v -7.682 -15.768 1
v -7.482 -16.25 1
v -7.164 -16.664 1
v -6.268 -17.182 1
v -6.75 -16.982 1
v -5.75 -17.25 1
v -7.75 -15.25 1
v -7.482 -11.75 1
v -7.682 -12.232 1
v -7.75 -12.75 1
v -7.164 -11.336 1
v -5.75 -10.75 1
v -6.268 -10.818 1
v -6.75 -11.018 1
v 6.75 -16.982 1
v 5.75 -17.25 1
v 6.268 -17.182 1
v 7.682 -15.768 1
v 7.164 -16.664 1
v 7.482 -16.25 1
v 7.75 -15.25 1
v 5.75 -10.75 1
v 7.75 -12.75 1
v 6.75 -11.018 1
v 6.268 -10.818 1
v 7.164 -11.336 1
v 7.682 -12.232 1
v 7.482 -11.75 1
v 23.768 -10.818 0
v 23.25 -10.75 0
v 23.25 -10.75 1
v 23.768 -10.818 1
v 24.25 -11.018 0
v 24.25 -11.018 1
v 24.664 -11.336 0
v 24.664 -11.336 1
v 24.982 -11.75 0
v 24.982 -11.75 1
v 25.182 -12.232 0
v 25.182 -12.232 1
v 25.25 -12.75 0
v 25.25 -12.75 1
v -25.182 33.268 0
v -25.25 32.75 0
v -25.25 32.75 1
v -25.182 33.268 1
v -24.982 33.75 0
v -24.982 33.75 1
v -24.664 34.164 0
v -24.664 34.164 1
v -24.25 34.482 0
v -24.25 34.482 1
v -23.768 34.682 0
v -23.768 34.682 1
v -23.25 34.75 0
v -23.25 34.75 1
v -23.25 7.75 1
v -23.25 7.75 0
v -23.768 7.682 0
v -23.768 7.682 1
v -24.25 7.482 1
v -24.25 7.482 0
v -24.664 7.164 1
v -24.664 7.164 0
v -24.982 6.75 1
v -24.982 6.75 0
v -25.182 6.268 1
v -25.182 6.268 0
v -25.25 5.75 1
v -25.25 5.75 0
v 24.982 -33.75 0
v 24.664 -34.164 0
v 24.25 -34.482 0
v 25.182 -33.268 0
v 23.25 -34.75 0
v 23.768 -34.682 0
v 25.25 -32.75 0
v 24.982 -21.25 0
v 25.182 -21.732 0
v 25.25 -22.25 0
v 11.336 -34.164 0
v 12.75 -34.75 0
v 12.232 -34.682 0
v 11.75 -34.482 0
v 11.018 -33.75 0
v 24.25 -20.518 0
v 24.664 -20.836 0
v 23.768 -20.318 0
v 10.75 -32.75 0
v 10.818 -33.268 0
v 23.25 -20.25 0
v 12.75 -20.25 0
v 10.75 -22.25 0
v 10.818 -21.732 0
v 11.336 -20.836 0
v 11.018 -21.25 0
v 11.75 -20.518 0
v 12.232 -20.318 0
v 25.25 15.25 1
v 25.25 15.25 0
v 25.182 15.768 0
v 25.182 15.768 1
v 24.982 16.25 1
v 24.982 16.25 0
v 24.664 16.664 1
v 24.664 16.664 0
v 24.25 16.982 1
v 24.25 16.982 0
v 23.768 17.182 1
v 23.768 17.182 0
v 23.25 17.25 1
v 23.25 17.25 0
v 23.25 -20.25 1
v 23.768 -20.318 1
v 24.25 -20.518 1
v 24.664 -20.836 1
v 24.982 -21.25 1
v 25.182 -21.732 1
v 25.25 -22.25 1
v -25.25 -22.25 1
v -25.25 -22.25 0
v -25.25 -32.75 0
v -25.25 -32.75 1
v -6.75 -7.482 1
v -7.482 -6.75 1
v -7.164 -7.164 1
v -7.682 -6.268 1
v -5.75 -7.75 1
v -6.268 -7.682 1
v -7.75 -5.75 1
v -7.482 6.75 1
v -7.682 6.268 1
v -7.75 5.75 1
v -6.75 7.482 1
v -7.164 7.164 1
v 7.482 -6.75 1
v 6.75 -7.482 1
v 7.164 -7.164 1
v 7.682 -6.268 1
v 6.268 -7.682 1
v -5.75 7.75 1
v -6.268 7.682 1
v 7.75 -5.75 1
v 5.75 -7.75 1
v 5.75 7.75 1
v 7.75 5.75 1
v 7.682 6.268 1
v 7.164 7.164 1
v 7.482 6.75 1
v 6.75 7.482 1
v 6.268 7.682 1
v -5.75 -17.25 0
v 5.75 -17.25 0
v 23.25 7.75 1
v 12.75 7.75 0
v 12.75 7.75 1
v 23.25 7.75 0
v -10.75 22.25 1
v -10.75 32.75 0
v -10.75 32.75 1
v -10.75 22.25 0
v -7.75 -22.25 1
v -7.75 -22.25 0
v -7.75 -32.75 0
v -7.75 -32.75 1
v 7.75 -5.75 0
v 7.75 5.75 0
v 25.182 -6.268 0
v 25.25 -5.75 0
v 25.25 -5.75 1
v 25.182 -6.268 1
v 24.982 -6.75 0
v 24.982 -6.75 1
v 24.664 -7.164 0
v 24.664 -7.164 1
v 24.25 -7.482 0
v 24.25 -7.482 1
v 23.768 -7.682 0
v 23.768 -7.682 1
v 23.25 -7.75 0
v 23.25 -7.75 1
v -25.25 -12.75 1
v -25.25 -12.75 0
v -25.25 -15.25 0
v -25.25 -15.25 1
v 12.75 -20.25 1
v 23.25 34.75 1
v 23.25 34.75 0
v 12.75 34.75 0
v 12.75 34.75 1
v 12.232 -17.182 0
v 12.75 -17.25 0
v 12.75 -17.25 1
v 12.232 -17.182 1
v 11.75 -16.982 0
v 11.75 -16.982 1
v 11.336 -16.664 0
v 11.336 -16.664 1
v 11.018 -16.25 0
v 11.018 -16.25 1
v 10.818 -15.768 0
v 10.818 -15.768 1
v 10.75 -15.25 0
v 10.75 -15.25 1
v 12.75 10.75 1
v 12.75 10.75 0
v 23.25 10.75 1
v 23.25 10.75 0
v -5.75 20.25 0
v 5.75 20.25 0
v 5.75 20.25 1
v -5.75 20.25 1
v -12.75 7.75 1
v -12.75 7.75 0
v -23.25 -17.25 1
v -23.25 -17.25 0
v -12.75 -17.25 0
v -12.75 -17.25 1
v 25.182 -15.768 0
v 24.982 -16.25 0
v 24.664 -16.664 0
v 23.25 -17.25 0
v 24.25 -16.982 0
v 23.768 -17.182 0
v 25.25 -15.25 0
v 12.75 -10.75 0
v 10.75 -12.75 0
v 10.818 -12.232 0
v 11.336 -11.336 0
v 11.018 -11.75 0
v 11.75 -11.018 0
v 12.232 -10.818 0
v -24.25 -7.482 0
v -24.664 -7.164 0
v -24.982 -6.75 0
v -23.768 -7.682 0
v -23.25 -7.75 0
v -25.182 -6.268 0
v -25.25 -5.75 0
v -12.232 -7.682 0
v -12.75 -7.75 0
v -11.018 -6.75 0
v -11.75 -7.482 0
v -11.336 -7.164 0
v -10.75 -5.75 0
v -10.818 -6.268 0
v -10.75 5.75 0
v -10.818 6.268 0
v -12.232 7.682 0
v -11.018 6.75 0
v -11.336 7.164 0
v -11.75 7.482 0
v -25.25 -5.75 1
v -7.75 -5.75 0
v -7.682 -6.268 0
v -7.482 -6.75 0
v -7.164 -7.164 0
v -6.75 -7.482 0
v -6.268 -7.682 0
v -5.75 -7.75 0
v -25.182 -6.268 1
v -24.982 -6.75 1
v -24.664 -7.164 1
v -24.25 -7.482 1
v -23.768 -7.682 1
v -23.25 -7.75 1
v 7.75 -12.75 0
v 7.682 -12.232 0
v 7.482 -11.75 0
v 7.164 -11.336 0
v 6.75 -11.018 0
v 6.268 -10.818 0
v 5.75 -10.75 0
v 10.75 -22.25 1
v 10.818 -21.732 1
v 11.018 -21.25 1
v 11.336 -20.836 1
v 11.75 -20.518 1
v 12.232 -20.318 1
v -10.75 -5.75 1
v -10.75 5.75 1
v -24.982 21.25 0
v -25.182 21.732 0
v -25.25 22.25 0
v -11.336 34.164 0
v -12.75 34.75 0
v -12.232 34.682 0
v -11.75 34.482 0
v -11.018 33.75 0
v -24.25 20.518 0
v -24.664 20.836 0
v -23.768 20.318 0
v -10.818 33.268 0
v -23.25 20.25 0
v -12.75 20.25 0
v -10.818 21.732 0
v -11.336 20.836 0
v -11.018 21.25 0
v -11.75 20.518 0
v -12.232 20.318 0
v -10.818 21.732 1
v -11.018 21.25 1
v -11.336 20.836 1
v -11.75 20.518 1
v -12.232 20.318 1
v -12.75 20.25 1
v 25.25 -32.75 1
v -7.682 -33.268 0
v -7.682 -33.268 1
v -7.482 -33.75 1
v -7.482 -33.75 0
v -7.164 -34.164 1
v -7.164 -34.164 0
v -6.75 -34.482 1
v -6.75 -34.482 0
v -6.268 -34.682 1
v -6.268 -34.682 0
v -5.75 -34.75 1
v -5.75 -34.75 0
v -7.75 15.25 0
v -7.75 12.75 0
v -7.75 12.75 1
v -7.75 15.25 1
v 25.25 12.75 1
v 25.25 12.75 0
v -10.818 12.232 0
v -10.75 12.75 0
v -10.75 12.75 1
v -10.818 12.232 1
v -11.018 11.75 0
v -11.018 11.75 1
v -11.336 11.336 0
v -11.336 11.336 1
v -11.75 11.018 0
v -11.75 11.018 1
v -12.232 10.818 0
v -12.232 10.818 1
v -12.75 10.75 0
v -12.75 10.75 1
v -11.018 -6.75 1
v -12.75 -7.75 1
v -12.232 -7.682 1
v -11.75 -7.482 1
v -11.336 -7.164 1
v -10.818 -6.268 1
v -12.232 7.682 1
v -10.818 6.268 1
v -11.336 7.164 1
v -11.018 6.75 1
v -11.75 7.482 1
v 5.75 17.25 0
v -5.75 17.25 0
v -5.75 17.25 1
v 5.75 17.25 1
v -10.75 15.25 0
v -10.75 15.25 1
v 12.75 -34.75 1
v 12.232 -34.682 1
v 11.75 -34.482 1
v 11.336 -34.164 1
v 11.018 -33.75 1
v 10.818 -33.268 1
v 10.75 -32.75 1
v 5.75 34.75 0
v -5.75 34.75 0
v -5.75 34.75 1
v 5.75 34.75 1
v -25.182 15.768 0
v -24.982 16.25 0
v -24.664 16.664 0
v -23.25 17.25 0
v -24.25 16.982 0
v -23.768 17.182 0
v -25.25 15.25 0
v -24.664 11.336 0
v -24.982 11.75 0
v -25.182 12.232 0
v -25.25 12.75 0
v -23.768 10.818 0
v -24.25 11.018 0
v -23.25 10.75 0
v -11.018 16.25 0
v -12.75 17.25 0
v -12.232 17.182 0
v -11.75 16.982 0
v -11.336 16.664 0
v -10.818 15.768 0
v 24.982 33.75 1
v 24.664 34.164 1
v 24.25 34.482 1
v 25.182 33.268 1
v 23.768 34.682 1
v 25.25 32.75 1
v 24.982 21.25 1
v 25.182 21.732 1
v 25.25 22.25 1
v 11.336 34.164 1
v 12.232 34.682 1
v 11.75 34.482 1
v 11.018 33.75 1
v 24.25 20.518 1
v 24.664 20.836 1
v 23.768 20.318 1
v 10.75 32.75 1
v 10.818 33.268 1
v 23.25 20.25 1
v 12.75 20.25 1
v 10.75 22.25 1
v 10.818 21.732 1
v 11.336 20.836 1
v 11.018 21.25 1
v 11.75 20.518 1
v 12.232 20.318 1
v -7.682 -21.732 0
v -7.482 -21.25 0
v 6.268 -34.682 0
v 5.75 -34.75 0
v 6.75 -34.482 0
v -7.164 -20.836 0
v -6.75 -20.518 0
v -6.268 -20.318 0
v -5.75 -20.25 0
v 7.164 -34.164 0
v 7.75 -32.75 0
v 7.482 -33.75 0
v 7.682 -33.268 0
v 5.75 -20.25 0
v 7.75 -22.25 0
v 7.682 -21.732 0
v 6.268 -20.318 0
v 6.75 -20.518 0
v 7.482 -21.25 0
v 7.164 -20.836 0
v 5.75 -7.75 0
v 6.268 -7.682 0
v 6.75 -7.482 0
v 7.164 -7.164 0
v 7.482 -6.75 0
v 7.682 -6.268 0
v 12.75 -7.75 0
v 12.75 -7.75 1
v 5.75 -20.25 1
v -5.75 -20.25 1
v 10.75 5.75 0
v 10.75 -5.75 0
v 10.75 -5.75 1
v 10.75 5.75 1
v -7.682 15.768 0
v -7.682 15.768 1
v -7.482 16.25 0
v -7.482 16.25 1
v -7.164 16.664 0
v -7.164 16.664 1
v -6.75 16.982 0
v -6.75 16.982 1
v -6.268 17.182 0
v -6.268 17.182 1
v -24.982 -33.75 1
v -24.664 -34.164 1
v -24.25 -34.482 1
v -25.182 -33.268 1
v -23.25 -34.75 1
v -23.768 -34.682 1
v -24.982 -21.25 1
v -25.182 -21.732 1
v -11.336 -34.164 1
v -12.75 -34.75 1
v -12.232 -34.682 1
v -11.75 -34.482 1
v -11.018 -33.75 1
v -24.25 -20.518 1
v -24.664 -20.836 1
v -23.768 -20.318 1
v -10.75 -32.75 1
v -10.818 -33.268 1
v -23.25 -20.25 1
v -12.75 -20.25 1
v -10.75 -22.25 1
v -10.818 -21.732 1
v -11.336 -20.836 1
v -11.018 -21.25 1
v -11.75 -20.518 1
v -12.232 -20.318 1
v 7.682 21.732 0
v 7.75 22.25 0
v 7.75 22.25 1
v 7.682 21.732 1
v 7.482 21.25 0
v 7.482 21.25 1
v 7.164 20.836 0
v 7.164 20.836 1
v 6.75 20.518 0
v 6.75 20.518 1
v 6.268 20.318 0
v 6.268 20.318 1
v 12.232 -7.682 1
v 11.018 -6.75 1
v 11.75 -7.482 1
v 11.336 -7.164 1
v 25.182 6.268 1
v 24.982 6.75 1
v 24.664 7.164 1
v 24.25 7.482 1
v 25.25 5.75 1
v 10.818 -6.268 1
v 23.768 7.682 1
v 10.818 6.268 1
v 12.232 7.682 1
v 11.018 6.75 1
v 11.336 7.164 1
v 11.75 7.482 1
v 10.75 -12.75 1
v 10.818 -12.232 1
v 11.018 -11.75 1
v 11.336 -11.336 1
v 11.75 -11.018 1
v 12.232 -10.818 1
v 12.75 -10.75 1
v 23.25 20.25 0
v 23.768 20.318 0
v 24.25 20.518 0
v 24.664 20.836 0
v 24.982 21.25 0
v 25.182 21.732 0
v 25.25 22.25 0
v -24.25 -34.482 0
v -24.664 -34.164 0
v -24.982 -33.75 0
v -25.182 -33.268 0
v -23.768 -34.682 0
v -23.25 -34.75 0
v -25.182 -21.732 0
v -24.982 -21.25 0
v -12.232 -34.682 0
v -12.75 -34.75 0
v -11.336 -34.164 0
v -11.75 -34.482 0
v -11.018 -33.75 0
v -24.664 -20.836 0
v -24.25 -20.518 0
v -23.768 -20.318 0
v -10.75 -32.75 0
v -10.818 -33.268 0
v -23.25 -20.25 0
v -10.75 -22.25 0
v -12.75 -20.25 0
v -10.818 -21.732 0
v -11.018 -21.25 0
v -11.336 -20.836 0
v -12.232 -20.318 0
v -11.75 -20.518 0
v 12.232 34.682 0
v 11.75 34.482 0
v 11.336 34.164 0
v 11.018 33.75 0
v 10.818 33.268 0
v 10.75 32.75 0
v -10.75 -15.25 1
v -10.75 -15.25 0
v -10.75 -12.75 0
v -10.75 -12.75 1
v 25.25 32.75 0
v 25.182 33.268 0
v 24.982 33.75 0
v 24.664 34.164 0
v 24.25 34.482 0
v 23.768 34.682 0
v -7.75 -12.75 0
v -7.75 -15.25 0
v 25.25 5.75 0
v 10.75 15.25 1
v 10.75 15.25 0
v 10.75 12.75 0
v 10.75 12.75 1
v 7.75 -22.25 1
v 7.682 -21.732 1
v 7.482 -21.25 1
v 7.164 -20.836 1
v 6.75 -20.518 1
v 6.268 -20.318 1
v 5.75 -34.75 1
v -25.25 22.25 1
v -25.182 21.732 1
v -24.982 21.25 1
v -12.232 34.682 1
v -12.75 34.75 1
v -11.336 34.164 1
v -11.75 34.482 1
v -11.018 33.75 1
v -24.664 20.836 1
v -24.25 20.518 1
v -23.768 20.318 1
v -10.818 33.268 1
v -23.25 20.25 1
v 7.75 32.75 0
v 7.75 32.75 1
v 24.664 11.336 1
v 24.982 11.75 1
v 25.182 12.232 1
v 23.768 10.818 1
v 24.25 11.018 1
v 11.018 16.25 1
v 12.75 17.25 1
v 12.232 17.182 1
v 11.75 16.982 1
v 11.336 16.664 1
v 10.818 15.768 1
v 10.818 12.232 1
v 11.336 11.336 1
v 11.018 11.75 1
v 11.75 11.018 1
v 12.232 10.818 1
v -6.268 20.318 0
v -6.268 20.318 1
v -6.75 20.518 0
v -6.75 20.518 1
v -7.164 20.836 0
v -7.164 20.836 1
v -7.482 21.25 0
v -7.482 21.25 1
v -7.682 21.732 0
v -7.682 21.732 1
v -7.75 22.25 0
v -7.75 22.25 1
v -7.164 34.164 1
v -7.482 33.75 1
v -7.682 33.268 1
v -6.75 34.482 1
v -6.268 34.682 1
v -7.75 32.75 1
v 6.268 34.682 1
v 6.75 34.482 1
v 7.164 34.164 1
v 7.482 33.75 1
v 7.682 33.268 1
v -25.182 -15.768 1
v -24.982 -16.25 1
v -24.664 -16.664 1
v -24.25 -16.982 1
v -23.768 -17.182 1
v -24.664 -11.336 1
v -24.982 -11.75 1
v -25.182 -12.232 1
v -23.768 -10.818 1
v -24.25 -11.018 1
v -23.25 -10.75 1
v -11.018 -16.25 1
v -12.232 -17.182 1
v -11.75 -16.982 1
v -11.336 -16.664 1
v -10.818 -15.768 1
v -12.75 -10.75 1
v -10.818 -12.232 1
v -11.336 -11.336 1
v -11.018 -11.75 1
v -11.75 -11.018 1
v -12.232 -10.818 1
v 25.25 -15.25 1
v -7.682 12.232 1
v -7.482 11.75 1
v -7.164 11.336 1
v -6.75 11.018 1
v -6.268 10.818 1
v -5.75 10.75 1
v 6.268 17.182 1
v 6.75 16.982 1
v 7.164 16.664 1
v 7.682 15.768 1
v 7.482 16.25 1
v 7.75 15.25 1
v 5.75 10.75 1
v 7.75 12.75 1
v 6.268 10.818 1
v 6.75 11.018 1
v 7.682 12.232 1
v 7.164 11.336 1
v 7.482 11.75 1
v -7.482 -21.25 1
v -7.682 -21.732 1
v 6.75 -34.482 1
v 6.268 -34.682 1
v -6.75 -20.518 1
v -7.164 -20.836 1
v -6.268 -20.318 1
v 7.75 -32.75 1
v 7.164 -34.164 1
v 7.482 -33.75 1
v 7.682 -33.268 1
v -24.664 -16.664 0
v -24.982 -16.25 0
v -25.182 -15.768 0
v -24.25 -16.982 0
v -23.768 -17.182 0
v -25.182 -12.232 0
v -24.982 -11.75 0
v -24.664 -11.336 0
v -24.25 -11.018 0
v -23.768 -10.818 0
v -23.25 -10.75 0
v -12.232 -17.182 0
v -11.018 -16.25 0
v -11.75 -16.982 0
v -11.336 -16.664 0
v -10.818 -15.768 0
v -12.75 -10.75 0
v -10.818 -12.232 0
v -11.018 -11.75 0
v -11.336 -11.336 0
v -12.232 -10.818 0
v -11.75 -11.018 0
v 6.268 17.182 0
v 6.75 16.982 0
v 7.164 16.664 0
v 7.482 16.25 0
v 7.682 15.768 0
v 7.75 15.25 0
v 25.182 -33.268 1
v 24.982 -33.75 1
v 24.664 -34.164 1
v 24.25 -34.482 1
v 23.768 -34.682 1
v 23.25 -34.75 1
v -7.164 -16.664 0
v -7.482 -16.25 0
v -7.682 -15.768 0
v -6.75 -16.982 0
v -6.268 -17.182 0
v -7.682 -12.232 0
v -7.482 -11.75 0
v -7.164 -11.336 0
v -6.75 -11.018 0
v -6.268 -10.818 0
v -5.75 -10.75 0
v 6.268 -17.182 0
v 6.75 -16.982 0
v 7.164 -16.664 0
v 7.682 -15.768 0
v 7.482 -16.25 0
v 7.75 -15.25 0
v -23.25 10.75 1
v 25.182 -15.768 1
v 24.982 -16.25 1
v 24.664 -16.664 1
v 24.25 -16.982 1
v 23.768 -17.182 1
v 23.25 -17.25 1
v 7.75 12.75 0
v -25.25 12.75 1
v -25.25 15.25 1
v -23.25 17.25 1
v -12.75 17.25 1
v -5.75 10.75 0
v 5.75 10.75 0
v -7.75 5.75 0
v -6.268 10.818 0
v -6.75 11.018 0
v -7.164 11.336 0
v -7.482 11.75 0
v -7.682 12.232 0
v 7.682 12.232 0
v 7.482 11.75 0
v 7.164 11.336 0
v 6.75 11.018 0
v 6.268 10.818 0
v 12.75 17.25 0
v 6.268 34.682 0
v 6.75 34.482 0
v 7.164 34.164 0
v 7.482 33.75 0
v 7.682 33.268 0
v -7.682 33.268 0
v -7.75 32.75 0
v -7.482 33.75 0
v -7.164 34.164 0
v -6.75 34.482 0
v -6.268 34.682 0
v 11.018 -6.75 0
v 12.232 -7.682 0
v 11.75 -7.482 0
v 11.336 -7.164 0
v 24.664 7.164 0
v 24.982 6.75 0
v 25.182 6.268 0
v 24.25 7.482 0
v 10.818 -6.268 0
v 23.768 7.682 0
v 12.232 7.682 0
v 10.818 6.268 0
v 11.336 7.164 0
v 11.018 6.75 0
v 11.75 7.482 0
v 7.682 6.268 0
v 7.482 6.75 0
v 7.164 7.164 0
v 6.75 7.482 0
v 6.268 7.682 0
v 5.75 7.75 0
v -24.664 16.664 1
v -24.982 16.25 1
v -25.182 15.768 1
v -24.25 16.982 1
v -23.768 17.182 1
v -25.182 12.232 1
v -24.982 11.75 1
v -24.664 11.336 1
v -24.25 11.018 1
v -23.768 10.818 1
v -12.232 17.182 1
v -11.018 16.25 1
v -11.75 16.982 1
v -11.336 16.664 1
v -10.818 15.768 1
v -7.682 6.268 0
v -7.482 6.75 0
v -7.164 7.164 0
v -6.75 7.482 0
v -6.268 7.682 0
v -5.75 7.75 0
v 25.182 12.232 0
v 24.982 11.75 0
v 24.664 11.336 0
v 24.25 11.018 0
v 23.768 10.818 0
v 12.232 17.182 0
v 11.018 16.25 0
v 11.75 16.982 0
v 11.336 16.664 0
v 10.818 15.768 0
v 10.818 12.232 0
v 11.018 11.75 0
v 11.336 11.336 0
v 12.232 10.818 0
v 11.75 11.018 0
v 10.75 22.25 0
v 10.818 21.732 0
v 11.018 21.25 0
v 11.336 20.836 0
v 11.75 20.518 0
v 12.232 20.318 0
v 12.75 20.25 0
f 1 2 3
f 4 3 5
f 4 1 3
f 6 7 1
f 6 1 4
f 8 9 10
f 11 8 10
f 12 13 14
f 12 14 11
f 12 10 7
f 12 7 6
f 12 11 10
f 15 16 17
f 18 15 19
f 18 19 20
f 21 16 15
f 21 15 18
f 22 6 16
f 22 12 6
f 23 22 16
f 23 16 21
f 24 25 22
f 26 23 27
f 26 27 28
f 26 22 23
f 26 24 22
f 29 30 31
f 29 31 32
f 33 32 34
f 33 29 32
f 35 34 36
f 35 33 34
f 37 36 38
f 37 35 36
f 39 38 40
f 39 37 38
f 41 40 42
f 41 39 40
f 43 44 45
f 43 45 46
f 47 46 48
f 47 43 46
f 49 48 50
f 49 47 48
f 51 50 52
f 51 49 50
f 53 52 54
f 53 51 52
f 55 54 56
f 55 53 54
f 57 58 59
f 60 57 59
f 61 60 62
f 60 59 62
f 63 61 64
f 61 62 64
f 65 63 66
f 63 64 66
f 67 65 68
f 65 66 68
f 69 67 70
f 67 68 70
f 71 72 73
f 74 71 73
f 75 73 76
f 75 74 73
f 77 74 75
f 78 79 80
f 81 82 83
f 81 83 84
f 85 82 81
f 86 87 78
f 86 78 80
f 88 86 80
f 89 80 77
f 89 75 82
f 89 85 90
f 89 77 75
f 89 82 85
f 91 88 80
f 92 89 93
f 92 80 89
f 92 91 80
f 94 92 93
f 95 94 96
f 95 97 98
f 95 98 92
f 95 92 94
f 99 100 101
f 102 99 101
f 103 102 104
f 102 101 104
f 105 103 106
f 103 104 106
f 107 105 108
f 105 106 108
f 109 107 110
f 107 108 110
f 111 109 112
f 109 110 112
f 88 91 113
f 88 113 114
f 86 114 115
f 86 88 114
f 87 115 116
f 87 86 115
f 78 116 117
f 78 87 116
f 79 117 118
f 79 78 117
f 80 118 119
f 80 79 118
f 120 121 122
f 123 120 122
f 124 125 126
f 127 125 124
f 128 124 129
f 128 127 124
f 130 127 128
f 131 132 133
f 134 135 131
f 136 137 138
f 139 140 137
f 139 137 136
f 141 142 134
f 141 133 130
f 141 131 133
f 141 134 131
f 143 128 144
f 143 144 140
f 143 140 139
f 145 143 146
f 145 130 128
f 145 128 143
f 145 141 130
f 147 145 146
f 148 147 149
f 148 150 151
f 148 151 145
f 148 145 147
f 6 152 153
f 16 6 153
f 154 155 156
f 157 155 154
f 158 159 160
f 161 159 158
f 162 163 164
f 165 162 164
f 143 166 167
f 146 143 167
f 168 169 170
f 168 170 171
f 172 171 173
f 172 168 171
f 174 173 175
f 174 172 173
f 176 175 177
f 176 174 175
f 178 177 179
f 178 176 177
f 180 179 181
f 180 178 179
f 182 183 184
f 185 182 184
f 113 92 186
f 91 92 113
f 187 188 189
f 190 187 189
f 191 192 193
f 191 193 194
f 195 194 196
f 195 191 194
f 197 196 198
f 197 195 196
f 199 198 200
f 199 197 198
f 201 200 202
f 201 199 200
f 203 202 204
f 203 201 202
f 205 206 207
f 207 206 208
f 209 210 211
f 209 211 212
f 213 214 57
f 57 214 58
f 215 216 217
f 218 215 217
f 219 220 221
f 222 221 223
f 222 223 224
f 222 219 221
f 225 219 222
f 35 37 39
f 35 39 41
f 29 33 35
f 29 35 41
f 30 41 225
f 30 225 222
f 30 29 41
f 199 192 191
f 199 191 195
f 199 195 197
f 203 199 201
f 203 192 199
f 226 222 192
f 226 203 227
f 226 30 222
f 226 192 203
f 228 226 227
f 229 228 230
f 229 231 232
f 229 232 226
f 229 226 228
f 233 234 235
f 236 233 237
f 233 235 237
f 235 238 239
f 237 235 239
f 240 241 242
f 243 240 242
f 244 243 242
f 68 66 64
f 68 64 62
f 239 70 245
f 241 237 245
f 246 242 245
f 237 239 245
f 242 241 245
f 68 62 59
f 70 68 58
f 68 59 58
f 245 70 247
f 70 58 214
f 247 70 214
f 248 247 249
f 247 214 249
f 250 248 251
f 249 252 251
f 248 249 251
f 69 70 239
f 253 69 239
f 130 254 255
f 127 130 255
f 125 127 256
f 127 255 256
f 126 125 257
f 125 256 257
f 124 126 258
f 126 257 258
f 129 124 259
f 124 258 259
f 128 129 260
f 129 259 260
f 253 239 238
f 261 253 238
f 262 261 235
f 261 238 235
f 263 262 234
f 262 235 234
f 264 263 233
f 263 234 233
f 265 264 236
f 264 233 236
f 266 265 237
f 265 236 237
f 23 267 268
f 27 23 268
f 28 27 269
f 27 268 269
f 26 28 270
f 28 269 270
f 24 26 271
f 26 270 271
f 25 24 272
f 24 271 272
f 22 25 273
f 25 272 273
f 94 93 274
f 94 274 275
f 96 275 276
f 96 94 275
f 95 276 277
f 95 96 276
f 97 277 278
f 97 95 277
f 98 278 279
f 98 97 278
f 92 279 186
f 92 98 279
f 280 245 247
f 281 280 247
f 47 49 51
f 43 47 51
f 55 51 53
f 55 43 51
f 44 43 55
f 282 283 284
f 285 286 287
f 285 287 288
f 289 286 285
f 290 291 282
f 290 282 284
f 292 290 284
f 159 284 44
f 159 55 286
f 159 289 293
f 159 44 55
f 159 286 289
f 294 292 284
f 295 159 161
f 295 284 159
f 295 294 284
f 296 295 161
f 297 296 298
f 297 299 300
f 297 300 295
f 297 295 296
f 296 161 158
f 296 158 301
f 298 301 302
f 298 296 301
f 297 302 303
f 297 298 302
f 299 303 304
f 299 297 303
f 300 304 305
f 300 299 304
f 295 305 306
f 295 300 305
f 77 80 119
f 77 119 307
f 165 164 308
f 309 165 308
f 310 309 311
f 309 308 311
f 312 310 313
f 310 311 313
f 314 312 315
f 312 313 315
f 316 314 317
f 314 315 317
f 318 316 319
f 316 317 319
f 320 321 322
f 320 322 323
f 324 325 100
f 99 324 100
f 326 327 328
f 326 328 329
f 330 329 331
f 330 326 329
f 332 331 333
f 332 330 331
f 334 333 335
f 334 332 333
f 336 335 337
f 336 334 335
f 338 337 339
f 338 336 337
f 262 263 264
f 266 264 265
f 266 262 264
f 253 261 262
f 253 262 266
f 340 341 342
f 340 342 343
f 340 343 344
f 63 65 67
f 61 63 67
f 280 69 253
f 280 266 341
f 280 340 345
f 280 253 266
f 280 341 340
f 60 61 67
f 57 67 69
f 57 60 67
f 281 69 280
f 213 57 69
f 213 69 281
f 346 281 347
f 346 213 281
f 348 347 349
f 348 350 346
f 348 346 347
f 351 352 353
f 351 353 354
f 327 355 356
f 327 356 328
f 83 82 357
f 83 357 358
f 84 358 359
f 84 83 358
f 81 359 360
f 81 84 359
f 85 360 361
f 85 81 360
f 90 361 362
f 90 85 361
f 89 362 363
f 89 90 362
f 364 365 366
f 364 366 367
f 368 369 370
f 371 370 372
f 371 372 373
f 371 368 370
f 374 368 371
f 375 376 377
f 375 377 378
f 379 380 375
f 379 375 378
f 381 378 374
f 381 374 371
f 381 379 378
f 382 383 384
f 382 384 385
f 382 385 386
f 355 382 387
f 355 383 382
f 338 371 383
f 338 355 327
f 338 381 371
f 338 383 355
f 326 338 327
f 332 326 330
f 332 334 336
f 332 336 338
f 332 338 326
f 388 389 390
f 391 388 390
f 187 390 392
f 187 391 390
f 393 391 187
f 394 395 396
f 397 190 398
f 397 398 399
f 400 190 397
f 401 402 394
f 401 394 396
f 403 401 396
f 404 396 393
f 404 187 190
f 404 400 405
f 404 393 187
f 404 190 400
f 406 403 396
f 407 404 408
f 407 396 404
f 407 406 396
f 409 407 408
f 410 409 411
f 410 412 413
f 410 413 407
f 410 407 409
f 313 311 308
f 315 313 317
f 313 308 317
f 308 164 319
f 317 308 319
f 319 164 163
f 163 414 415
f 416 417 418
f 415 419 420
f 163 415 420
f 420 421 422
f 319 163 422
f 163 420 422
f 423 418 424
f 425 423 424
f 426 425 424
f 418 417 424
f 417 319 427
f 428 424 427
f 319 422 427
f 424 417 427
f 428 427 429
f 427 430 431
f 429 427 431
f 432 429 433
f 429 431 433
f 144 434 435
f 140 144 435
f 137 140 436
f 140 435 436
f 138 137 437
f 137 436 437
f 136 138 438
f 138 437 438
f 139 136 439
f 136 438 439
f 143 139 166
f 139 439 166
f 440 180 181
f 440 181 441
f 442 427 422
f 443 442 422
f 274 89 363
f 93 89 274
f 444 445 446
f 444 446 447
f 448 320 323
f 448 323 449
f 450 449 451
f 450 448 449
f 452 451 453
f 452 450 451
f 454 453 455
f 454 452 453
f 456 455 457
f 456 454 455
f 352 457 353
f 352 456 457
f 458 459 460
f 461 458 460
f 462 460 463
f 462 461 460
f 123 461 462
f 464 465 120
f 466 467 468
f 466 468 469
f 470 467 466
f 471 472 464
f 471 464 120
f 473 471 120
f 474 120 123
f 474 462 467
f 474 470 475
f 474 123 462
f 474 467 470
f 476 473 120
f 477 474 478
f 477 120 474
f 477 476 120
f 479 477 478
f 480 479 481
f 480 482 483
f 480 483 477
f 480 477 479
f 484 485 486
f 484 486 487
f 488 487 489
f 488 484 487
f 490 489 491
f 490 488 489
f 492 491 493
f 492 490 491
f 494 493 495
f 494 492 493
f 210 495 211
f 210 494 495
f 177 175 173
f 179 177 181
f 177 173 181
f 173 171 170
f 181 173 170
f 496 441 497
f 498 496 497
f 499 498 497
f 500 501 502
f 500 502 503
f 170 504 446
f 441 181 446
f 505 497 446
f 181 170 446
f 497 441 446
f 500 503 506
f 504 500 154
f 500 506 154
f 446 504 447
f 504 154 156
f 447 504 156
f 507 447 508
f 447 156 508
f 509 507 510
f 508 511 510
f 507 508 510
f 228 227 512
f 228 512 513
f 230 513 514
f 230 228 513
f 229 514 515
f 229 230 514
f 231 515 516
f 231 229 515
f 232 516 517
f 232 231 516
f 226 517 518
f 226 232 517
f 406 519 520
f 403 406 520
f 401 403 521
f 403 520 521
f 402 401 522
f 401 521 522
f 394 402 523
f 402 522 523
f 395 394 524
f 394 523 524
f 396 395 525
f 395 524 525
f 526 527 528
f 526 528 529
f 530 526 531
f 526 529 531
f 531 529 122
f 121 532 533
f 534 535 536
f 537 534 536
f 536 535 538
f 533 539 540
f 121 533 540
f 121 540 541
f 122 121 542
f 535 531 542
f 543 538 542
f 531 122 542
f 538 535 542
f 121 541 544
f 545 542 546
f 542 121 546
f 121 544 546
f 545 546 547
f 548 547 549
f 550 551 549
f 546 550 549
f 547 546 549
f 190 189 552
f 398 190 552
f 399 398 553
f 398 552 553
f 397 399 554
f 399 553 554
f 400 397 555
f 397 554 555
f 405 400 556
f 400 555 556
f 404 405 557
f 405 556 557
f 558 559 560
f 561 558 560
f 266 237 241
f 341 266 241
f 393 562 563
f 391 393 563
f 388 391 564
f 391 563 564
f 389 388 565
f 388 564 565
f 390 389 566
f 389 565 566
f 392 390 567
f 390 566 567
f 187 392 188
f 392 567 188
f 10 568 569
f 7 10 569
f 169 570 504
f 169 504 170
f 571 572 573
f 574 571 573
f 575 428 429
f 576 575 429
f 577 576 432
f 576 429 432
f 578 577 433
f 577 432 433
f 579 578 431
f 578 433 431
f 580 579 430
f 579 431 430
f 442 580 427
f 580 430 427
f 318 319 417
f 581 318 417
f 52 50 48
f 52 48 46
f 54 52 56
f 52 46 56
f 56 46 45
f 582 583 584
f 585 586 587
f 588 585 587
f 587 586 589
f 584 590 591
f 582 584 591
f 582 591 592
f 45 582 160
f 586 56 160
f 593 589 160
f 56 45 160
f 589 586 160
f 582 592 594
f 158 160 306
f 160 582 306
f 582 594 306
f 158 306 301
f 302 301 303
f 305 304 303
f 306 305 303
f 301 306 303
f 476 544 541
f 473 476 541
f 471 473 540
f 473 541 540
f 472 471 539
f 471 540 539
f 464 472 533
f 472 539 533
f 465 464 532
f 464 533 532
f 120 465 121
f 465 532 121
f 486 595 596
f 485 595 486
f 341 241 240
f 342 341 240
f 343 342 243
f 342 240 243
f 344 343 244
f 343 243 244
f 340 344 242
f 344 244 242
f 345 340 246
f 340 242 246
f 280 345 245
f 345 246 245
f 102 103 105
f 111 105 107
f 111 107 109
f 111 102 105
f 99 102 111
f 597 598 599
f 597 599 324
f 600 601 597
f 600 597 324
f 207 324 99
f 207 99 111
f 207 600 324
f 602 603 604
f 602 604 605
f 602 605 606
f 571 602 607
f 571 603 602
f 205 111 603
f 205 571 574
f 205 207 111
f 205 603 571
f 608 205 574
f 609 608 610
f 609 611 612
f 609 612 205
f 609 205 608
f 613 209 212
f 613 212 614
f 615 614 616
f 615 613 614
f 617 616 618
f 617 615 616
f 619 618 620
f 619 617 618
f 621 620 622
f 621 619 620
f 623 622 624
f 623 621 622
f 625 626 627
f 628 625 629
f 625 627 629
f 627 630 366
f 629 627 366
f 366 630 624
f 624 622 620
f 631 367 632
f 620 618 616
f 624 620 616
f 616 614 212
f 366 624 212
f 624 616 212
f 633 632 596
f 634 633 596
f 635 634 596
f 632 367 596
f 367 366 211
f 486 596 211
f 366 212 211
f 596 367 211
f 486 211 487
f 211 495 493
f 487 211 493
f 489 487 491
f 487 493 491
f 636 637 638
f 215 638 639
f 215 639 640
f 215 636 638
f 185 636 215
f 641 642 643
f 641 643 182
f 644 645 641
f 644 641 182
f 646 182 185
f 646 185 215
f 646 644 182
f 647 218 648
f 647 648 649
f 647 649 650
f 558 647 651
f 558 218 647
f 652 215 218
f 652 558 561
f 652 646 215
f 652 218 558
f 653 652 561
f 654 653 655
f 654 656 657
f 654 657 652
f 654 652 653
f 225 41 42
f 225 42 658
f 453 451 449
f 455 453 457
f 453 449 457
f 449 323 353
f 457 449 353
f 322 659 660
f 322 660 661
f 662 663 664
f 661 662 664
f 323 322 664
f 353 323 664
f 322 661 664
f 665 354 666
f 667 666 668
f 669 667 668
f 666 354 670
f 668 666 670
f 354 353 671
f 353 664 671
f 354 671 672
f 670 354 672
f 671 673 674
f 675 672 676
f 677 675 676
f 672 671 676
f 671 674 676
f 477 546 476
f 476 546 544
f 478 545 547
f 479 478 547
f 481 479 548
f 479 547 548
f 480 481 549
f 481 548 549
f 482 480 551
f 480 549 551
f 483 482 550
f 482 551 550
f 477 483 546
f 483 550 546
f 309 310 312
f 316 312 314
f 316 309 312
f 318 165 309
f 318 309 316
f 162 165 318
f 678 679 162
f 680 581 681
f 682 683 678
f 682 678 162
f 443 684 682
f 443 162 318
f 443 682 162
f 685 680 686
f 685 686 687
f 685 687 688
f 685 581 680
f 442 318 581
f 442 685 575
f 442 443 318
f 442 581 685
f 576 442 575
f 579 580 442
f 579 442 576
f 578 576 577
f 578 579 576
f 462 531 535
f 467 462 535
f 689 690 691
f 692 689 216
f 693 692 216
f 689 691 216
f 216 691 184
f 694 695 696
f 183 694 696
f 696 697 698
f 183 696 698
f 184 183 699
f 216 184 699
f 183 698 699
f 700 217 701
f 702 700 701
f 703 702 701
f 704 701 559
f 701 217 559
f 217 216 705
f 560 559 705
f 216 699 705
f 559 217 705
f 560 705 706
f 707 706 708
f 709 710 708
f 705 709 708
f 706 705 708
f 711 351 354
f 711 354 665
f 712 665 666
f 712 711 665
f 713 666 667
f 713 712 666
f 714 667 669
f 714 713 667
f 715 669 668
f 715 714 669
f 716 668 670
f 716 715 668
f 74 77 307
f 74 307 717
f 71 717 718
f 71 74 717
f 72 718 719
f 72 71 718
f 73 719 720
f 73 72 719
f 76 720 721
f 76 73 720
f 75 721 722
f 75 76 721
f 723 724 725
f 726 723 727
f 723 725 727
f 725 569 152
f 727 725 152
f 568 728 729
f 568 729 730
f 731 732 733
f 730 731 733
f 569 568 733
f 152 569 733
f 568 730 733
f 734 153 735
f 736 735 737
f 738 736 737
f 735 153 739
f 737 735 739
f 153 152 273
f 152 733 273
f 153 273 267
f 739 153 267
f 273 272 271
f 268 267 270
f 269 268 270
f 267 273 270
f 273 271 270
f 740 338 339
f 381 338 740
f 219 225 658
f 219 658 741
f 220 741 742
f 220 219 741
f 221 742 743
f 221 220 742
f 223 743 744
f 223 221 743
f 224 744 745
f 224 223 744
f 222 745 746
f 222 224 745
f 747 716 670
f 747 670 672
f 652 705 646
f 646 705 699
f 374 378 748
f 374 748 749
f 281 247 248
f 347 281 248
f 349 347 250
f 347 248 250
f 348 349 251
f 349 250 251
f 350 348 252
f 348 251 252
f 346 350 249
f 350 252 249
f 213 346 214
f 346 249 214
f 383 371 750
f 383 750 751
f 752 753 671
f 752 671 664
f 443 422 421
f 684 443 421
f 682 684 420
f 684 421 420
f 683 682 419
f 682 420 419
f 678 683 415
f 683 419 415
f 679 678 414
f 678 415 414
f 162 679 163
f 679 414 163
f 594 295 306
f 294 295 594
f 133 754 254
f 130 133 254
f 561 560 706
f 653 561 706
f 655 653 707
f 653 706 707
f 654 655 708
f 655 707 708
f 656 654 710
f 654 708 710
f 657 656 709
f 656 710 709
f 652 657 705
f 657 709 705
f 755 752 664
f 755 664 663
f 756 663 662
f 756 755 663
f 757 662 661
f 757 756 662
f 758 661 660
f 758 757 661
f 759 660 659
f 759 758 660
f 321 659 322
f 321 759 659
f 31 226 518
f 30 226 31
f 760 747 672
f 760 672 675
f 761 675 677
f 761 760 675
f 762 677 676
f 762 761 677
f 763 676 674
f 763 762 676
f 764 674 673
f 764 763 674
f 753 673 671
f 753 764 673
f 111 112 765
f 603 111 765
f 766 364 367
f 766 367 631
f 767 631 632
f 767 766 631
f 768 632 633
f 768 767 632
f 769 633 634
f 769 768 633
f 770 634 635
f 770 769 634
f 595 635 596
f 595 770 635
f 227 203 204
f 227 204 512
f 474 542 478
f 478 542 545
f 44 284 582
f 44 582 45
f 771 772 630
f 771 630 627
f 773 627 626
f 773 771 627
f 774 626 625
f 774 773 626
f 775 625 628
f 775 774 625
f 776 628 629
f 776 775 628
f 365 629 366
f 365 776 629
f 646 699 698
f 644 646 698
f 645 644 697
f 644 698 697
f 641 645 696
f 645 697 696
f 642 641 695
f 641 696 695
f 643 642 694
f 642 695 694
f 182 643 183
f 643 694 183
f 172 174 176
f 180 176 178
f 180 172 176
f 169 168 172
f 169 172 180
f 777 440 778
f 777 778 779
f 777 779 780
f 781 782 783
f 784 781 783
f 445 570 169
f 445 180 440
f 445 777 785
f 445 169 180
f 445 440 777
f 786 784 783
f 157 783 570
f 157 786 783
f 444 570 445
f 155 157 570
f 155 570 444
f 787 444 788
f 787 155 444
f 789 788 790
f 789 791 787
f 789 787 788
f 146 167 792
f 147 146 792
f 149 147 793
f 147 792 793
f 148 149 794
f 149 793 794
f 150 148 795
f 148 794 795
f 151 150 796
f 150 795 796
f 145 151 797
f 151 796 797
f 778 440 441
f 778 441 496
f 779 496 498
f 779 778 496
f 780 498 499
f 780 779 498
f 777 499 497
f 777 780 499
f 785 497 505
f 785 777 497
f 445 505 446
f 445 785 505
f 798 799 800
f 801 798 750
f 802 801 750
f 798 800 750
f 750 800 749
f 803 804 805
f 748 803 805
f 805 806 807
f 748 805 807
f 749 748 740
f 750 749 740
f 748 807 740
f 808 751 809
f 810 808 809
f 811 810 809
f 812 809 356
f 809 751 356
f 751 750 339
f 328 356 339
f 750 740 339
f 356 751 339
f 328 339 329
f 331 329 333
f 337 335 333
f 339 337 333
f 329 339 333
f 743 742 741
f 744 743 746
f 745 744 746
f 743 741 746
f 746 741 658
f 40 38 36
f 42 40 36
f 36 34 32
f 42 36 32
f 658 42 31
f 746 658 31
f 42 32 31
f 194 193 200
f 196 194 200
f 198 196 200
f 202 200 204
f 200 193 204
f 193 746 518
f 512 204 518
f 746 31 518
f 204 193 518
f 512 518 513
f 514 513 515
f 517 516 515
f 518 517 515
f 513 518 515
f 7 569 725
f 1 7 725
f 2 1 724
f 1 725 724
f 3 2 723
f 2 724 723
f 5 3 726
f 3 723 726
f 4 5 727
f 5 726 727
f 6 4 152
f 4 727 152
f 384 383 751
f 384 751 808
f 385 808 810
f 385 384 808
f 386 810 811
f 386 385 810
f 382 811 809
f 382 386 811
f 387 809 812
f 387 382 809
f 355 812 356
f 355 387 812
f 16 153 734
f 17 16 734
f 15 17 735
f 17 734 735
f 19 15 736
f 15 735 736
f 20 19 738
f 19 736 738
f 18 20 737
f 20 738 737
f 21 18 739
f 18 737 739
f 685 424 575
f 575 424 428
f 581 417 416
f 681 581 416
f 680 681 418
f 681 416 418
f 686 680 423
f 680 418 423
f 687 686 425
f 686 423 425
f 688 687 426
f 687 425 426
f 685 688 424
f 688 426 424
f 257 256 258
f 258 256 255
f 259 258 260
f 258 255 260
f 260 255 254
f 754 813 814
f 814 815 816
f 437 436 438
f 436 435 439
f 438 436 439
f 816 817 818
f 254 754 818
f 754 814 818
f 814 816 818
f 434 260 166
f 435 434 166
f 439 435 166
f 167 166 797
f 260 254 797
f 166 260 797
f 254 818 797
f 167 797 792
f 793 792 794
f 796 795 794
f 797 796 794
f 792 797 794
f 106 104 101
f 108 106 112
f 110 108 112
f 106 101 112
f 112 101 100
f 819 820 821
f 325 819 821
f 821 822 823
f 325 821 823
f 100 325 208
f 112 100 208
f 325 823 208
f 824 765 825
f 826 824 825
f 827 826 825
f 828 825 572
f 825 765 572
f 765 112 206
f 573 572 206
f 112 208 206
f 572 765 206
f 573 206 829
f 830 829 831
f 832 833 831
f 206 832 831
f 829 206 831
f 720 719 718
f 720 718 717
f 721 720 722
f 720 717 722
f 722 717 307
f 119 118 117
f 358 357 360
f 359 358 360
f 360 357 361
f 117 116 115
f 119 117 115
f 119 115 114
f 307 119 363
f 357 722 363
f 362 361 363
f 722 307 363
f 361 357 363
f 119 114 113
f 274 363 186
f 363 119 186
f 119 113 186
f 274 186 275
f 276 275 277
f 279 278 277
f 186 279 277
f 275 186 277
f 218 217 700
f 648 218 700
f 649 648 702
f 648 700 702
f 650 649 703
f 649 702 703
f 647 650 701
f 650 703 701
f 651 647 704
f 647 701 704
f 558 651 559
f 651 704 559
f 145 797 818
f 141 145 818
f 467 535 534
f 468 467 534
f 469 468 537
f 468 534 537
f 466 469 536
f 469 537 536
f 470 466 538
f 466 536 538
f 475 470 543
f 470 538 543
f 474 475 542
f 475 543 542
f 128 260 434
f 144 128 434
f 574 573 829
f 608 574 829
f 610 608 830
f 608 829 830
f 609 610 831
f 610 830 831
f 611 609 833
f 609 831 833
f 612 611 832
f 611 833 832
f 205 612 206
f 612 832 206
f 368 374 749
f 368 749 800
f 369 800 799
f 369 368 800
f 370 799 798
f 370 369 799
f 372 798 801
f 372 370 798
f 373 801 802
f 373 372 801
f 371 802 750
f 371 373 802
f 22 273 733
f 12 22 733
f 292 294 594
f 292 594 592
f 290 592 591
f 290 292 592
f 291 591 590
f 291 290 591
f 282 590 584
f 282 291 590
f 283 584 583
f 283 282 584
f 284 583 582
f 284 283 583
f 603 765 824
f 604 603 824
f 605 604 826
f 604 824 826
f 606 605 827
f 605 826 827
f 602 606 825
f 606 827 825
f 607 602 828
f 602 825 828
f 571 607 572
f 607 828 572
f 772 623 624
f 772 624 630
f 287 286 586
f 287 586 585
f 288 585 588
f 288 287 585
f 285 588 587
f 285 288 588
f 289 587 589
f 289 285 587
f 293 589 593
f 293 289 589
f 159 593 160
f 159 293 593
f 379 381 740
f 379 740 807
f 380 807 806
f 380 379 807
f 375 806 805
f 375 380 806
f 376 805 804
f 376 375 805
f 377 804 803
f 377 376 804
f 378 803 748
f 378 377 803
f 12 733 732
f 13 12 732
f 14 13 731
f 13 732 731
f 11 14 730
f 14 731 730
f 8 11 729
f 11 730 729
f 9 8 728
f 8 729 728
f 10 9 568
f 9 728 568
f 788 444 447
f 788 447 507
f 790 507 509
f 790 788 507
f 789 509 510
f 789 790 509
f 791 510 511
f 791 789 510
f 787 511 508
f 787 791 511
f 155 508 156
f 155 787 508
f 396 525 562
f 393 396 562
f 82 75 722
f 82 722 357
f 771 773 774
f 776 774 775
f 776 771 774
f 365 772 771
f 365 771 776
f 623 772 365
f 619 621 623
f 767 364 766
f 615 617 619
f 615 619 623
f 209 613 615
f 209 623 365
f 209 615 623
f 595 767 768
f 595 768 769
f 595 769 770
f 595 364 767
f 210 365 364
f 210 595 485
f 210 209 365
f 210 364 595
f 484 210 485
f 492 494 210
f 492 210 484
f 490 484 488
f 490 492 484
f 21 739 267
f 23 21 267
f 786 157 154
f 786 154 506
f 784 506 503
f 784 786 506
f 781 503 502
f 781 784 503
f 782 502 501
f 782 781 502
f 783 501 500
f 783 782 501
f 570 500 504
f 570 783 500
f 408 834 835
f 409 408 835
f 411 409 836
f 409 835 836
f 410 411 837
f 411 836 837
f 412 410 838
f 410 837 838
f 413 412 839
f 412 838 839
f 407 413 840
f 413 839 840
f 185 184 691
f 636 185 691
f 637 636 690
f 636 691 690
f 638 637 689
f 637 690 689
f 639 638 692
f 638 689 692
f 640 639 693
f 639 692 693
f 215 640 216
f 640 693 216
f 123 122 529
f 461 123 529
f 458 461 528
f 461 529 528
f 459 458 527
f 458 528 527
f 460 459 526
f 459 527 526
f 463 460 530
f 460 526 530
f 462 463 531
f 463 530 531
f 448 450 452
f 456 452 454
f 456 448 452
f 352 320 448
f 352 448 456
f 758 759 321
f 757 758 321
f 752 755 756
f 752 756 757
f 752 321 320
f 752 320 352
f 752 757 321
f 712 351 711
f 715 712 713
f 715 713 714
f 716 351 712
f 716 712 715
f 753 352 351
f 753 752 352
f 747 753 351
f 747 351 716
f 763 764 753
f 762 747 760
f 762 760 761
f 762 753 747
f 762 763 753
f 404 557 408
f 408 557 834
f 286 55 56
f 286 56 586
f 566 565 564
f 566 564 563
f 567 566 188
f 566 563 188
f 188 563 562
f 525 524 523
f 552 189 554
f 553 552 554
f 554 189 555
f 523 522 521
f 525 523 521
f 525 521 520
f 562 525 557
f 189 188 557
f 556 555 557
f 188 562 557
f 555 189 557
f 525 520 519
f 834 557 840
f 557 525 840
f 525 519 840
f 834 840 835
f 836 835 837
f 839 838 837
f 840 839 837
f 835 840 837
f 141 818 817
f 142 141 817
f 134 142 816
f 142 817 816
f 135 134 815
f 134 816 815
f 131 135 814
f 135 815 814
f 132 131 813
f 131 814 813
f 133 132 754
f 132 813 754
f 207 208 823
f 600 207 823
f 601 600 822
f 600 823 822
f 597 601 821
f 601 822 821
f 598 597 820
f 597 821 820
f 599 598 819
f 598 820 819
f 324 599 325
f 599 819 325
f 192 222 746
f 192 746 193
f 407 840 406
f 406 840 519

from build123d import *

# Parameters (mm, degrees)
F1_DEPTH = 1


with BuildPart() as f1:
    # F0 (on Top) → F1 (new body)
    with BuildSketch(Plane.XY):
        with BuildLine():
            ThreePointArc((7.75, 5.75), (7.1642135624, 7.1642135624), (5.75, 7.75))
            Line((5.75, 7.75), (-5.75, 7.75))
            ThreePointArc((-5.75, 7.75), (-7.1642135624, 7.1642135624), (-7.75, 5.75))
            Line((-7.75, 5.75), (-7.75, -5.75))
            ThreePointArc((-7.75, -5.75), (-7.1642135624, -7.1642135624), (-5.75, -7.75))
            Line((-5.75, -7.75), (5.75, -7.75))
            ThreePointArc((5.75, -7.75), (7.1642135624, -7.1642135624), (7.75, -5.75))
            Line((7.75, -5.75), (7.75, 5.75))
        make_face()
    extrude(amount=F1_DEPTH)


with BuildPart() as f1b:
    # F0 (on Top) → F1, piece 2 (new body)
    with BuildSketch(Plane.XY):
        with BuildLine():
            Line((5.75, -10.75), (-5.75, -10.75))
            ThreePointArc((-5.75, -10.75), (-7.1642135624, -11.3357864376), (-7.75, -12.75))
            Line((-7.75, -12.75), (-7.75, -15.25))
            ThreePointArc((-7.75, -15.25), (-7.1642135624, -16.6642135624), (-5.75, -17.25))
            Line((-5.75, -17.25), (5.75, -17.25))
            ThreePointArc((5.75, -17.25), (7.1642135624, -16.6642135624), (7.75, -15.25))
            Line((7.75, -15.25), (7.75, -12.75))
            ThreePointArc((7.75, -12.75), (7.1642135624, -11.3357864376), (5.75, -10.75))
        make_face()
    extrude(amount=F1_DEPTH)


with BuildPart() as f1c:
    # F0 (on Top) → F1, piece 3 (new body)
    with BuildSketch(Plane.XY):
        with BuildLine():
            ThreePointArc((-10.75, 5.75), (-11.3357864376, 7.1642135624), (-12.75, 7.75))
            Line((-12.75, 7.75), (-23.25, 7.75))
            ThreePointArc((-23.25, 7.75), (-24.6642135624, 7.1642135624), (-25.25, 5.75))
            Line((-25.25, 5.75), (-25.25, -5.75))
            ThreePointArc((-25.25, -5.75), (-24.6642135624, -7.1642135624), (-23.25, -7.75))
            Line((-23.25, -7.75), (-12.75, -7.75))
            ThreePointArc((-12.75, -7.75), (-11.3357864376, -7.1642135624), (-10.75, -5.75))
            Line((-10.75, -5.75), (-10.75, 5.75))
        make_face()
    extrude(amount=F1_DEPTH)


with BuildPart() as f1d:
    # F0 (on Top) → F1, piece 4 (new body)
    with BuildSketch(Plane.XY):
        with BuildLine():
            Line((-12.75, -10.75), (-23.25, -10.75))
            ThreePointArc((-23.25, -10.75), (-24.6642135624, -11.3357864376), (-25.25, -12.75))
            Line((-25.25, -12.75), (-25.25, -15.25))
            ThreePointArc((-25.25, -15.25), (-24.6642135624, -16.6642135624), (-23.25, -17.25))
            Line((-23.25, -17.25), (-12.75, -17.25))
            ThreePointArc((-12.75, -17.25), (-11.3357864376, -16.6642135624), (-10.75, -15.25))
            Line((-10.75, -15.25), (-10.75, -12.75))
            ThreePointArc((-10.75, -12.75), (-11.3357864376, -11.3357864376), (-12.75, -10.75))
        make_face()
    extrude(amount=F1_DEPTH)


with BuildPart() as f1e:
    # F0 (on Top) → F1, piece 5 (new body)
    with BuildSketch(Plane.XY):
        with BuildLine():
            Line((-12.75, -20.25), (-23.25, -20.25))
            ThreePointArc((-23.25, -20.25), (-24.6642135624, -20.8357864376), (-25.25, -22.25))
            Line((-25.25, -22.25), (-25.25, -32.75))
            ThreePointArc((-25.25, -32.75), (-24.6642135624, -34.1642135624), (-23.25, -34.75))
            Line((-23.25, -34.75), (-12.75, -34.75))
            ThreePointArc((-12.75, -34.75), (-11.3357864376, -34.1642135624), (-10.75, -32.75))
            Line((-10.75, -32.75), (-10.75, -22.25))
            ThreePointArc((-10.75, -22.25), (-11.3357864376, -20.8357864376), (-12.75, -20.25))
        make_face()
    extrude(amount=F1_DEPTH)


with BuildPart() as f1f:
    # F0 (on Top) → F1, piece 6 (new body)
    with BuildSketch(Plane.XY):
        with BuildLine():
            Line((5.75, -20.25), (-5.75, -20.25))
            ThreePointArc((-5.75, -20.25), (-7.1642135624, -20.8357864376), (-7.75, -22.25))
            Line((-7.75, -22.25), (-7.75, -32.75))
            ThreePointArc((-7.75, -32.75), (-7.1642135624, -34.1642135624), (-5.75, -34.75))
            Line((-5.75, -34.75), (5.75, -34.75))
            ThreePointArc((5.75, -34.75), (7.1642135624, -34.1642135624), (7.75, -32.75))
            Line((7.75, -32.75), (7.75, -22.25))
            ThreePointArc((7.75, -22.25), (7.1642135624, -20.8357864376), (5.75, -20.25))
        make_face()
    extrude(amount=F1_DEPTH)


with BuildPart() as f2_1:
    # F2: instance of F1c
    add(f1c.part.mirror(Plane.YZ))


with BuildPart() as f2_2:
    # F2: instance of F1d
    add(f1d.part.mirror(Plane.YZ))


with BuildPart() as f2_3:
    # F2: instance of F1e
    add(f1e.part.mirror(Plane.YZ))


with BuildPart() as f3_1:
    # F3: instance of F1d
    add(f1d.part.mirror(Plane.XZ))


with BuildPart() as f3_2:
    # F3: instance of F1e
    add(f1e.part.mirror(Plane.XZ))


with BuildPart() as f3_3:
    # F3: instance of F1f
    add(f1f.part.mirror(Plane.XZ))


with BuildPart() as f3_4:
    # F3: instance of F1b
    add(f1b.part.mirror(Plane.XZ))


with BuildPart() as f3_5:
    # F3: instance of F2_2
    add(f2_2.part.mirror(Plane.XZ))


with BuildPart() as f3_6:
    # F3: instance of F2_3
    add(f2_3.part.mirror(Plane.XZ))


solid = Compound([f1.part, f1b.part, f1c.part, f1d.part, f1e.part, f1f.part, f2_1.part, f2_2.part, f2_3.part, f3_1.part, f3_2.part, f3_3.part, f3_4.part, f3_5.part, f3_6.part])
